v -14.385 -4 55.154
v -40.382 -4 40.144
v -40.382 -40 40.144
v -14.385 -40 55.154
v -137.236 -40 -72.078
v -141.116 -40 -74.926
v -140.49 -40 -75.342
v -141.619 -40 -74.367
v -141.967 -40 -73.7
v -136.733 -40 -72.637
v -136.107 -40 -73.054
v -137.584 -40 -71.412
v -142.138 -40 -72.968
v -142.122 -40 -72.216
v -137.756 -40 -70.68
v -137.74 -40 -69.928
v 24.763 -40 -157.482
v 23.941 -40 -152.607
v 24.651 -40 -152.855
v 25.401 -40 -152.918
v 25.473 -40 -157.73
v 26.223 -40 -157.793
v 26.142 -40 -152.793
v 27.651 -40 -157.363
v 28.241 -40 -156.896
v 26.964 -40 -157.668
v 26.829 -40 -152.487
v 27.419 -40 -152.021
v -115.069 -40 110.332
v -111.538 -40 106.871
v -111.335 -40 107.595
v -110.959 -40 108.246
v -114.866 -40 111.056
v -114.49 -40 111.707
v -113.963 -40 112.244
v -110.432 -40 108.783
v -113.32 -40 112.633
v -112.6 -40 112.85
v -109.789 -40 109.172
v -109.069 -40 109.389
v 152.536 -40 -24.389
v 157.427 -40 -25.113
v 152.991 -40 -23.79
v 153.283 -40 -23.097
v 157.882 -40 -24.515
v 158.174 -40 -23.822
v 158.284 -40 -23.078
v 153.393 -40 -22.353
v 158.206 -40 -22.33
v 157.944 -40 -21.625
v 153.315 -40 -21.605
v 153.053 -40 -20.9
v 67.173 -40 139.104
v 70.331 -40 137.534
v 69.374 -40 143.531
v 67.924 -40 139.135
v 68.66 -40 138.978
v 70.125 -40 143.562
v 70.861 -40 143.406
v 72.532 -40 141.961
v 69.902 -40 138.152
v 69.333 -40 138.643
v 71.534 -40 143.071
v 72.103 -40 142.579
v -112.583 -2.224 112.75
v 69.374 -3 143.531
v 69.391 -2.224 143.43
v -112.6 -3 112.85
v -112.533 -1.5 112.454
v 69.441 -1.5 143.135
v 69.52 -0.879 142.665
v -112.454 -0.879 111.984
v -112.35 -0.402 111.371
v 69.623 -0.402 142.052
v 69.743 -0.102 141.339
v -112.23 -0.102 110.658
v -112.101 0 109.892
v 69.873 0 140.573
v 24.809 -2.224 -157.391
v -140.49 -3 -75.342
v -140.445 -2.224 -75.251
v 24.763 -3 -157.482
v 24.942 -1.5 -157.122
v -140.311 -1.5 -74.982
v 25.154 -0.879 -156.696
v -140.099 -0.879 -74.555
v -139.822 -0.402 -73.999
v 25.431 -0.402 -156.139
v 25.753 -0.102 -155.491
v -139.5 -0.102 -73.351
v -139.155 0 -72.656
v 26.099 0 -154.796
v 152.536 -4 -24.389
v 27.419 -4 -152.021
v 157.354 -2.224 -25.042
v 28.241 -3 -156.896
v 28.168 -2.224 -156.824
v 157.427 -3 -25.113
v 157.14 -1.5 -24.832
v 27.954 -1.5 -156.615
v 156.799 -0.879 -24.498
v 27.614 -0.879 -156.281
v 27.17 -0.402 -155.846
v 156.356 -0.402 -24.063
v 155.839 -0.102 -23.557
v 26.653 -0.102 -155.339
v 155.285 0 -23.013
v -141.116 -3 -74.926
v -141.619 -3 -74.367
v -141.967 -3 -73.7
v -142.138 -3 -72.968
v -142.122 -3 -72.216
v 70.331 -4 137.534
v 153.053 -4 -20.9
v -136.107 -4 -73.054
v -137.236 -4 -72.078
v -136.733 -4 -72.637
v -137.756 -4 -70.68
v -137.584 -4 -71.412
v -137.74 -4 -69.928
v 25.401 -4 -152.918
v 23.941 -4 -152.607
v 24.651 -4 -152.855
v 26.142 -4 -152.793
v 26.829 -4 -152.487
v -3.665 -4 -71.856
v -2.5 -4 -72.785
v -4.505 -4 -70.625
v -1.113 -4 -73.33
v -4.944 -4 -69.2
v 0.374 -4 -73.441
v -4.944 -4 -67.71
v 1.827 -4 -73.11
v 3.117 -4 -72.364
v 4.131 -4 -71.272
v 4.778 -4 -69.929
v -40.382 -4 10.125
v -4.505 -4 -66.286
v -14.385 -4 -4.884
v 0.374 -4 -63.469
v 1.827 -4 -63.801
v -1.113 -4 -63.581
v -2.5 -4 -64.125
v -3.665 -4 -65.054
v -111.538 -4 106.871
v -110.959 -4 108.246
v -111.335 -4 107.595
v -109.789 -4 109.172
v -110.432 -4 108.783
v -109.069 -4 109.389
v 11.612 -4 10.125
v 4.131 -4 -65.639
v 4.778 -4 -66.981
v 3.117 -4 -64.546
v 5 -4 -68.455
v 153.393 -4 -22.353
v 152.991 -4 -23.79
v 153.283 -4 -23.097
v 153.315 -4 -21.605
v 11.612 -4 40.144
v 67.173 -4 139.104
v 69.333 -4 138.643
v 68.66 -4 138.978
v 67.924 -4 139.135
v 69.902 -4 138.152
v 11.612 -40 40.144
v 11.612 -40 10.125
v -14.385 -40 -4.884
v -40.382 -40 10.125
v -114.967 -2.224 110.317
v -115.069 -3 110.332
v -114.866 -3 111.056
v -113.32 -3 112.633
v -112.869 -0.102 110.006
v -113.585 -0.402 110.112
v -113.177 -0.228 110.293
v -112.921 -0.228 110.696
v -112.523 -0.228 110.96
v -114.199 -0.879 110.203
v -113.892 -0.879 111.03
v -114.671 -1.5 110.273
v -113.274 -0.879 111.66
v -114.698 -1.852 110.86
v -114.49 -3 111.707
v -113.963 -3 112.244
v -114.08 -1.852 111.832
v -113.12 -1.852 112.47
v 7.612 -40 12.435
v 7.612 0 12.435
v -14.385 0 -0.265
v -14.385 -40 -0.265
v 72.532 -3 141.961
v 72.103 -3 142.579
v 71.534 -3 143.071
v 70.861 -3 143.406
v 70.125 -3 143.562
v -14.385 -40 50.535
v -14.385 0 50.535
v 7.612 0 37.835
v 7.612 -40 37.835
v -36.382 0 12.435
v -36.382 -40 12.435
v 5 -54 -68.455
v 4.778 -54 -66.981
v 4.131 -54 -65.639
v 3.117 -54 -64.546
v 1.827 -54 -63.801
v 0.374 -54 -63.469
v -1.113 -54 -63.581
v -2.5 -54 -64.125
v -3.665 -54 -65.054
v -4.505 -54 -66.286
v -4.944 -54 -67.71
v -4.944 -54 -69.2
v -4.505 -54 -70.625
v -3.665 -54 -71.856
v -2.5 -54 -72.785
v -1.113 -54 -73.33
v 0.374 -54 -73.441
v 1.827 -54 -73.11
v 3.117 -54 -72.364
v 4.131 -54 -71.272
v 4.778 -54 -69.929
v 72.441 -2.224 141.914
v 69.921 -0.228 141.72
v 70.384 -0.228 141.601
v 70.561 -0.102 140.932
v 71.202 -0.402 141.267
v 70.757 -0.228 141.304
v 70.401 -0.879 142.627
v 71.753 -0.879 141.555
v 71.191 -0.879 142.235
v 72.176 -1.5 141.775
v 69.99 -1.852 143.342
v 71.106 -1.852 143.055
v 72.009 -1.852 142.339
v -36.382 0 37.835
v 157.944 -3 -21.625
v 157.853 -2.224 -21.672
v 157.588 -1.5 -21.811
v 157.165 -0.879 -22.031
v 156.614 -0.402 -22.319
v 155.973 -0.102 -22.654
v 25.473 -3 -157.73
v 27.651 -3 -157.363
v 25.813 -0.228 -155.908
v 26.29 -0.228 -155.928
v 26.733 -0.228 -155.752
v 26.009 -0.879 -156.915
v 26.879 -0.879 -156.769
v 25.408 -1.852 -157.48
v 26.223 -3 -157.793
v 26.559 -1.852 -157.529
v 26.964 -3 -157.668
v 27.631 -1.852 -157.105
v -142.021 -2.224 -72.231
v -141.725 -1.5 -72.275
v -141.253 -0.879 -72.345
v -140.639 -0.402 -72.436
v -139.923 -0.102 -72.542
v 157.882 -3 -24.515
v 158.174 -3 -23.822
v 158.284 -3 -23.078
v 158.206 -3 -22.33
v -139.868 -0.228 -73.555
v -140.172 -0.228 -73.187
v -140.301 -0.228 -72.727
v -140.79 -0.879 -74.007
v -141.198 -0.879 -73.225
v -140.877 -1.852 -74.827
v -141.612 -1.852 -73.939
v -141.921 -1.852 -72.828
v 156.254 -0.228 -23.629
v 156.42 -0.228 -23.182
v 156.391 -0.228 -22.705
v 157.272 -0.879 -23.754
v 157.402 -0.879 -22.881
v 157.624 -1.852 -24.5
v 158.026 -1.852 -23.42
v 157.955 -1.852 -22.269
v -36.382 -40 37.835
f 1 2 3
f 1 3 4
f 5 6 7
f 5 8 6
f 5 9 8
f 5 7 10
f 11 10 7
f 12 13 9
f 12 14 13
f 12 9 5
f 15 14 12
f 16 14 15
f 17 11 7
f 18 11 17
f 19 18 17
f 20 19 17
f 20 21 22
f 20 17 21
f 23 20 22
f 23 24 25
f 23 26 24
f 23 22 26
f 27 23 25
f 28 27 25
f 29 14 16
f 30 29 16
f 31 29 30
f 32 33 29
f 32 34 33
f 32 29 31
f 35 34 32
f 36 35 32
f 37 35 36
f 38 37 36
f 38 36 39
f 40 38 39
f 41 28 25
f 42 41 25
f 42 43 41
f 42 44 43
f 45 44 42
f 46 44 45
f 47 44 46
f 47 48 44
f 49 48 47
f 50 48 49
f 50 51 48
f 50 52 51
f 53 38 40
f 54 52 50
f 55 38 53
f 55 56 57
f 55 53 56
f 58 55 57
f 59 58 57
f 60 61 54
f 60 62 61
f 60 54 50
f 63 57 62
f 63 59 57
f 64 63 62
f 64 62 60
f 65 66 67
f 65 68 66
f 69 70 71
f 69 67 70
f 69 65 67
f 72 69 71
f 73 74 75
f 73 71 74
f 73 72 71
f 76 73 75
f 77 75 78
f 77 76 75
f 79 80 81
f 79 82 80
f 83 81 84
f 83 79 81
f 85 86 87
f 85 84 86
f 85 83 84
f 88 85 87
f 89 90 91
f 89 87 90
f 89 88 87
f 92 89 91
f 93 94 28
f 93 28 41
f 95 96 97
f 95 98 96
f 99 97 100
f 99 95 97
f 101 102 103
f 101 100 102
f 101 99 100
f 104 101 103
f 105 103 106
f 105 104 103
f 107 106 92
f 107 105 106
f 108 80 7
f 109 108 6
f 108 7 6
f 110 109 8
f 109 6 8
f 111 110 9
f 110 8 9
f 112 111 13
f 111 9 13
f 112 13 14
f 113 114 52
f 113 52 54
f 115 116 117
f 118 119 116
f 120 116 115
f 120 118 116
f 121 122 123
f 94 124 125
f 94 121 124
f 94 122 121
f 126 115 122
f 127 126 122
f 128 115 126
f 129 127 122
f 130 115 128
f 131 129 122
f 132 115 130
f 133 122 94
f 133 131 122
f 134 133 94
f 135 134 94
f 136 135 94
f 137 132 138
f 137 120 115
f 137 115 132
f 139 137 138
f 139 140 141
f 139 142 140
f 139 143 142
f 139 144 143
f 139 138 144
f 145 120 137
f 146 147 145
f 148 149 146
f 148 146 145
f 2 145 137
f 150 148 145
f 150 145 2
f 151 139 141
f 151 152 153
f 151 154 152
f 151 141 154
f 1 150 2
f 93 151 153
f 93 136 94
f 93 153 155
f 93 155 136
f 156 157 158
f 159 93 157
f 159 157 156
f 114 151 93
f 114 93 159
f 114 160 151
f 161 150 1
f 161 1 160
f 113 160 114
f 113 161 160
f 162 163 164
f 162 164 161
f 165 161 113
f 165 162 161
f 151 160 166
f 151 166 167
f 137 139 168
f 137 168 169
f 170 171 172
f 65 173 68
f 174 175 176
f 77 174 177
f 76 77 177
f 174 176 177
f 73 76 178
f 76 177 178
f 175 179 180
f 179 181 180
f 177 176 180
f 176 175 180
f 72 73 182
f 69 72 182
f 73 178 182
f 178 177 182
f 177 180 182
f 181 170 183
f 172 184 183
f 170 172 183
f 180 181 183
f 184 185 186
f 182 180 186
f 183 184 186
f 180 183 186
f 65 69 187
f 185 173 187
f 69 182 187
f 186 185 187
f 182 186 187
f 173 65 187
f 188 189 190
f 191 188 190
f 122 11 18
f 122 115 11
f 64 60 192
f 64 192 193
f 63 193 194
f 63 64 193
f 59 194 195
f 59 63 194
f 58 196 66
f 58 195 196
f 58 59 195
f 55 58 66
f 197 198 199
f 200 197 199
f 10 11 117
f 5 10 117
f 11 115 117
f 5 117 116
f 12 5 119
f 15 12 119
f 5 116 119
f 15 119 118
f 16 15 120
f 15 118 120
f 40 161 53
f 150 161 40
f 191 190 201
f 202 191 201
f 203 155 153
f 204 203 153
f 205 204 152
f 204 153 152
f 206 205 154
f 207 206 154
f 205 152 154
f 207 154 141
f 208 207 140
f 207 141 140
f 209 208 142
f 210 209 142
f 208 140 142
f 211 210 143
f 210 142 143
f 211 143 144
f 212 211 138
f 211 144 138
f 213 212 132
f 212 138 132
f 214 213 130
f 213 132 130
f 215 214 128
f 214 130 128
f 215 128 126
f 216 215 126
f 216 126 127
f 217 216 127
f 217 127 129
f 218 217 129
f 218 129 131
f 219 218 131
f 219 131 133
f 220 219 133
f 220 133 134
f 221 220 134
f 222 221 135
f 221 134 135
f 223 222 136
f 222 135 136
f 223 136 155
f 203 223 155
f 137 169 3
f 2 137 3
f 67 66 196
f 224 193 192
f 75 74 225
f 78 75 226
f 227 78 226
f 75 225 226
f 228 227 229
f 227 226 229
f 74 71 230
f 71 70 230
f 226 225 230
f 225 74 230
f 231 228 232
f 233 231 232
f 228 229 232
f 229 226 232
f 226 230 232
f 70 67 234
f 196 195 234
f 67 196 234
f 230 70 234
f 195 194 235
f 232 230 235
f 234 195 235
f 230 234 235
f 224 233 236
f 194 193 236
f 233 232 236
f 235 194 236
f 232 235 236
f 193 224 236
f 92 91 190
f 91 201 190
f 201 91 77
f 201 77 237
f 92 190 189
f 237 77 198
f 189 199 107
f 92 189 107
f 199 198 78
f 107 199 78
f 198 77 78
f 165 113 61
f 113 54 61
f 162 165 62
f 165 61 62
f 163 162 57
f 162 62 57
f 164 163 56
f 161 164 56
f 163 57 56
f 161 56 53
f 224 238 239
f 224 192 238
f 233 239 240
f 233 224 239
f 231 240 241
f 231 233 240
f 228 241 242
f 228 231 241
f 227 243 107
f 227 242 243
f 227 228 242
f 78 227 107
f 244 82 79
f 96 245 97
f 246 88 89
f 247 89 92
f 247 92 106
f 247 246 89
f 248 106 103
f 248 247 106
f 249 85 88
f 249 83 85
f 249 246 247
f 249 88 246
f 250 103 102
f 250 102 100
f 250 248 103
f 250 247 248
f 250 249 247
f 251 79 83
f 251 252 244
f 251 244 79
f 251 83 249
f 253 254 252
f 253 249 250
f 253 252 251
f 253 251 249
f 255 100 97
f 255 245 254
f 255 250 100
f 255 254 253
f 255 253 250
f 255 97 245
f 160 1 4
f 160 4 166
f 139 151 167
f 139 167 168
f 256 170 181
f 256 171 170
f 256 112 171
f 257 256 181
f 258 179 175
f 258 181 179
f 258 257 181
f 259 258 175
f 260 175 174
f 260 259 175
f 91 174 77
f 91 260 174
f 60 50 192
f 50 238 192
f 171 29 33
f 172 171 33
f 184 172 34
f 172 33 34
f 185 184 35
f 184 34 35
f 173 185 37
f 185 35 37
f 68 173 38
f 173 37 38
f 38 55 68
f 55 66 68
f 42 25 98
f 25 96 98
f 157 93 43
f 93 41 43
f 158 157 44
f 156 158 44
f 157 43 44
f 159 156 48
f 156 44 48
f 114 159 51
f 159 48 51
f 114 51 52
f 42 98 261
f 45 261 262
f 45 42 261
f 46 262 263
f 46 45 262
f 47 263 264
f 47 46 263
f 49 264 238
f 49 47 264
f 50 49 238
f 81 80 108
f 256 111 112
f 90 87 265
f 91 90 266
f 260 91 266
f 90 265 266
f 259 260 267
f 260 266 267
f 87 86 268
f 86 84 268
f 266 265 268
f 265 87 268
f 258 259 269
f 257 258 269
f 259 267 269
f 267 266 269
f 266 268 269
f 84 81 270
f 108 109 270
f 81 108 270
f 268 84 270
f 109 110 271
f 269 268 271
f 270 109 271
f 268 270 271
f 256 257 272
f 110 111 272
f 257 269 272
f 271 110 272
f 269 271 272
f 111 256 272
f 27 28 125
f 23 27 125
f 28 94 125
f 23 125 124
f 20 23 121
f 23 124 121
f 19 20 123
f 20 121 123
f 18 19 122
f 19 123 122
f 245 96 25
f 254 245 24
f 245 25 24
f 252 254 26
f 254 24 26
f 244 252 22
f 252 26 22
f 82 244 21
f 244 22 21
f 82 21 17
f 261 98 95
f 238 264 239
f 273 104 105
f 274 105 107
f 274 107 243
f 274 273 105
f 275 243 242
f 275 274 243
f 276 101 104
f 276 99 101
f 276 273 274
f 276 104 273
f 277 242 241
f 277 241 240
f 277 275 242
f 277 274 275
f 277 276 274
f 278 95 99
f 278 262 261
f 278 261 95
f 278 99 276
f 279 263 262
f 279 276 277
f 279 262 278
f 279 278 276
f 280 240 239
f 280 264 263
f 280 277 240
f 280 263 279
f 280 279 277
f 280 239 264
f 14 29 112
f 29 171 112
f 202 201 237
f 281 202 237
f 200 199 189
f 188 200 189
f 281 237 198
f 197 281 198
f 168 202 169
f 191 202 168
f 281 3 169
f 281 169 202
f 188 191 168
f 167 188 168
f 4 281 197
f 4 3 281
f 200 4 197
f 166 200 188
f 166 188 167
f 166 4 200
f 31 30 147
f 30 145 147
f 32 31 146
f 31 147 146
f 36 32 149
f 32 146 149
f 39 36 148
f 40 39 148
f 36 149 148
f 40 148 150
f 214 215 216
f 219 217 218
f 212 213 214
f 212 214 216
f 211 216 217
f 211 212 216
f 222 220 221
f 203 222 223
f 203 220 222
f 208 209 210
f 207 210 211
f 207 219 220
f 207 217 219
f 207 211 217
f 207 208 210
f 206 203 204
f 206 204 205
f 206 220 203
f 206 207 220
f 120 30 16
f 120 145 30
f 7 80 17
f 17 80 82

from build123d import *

# Parameters (mm, degrees)
F1_DEPTH = 40
F2_T     = -4
F3_R     = 3
F4_R     = 5
F5_DEPTH = 50


with BuildPart() as f1:
    # F0 (on Front) → F1 (new body)
    with BuildSketch(Plane.XZ):
        Polygon((26.7151626776, -158.4525242576), (158.9527449935, -23.5568932488), (71.5230363335, 143.8935635605), (-114.7490775608, 112.4880062915), (-142.4418664438, -74.3721523457), align=None)
        Polygon((-14.3848736808, 50.5347126111), (7.6121715753, 37.8347126111), (7.6121715753, 12.4347126111), (-14.3848736808, -0.2652873889), (-36.381918937, 12.4347126111), (-36.381918937, 37.8347126111), align=None, mode=Mode.SUBTRACT)
    extrude(amount=F1_DEPTH)

    # F2
    f2_openings = [f1.faces().sort_by_distance(p)[0] for p in [
        (0.403766, -40, -0.705501),
    ]]
    offset(amount=F2_T, openings=f2_openings, kind=Kind.INTERSECTION)

    # F3
    f3_edges = [f1.edges().sort_by_distance(p)[0] for p in [
        (-57.863352, 0, -116.412338),
        (92.833954, 0, -91.004709),
        (-128.595472, 0, 19.057927),
        (-21.613021, 0, 128.190785),
        (115.237891, 0, 60.168335),
        (71.523036, -20, 143.893564),
        (-114.749078, -20, 112.488006),
        (-142.441866, -20, -74.372152),
        (26.715163, -20, -158.452524),
        (158.952745, -20, -23.556893),
        (69.322328, -22, 139.466069),
        (-111.218337, -22, 109.026837),
        (-138.05904, -22, -72.083778),
        (154.061891, -22, -22.832066),
        (25.893158, -22, -153.577062),
    ]]
    fillet(f3_edges, radius=F3_R)

    # F4 (on face) → F5 (join)
    with BuildSketch(Plane.XZ.offset(4)):
        with Locations((0, -68.4551969171)):
            Circle(F4_R)
    extrude(amount=F5_DEPTH)


solid = f1.part
